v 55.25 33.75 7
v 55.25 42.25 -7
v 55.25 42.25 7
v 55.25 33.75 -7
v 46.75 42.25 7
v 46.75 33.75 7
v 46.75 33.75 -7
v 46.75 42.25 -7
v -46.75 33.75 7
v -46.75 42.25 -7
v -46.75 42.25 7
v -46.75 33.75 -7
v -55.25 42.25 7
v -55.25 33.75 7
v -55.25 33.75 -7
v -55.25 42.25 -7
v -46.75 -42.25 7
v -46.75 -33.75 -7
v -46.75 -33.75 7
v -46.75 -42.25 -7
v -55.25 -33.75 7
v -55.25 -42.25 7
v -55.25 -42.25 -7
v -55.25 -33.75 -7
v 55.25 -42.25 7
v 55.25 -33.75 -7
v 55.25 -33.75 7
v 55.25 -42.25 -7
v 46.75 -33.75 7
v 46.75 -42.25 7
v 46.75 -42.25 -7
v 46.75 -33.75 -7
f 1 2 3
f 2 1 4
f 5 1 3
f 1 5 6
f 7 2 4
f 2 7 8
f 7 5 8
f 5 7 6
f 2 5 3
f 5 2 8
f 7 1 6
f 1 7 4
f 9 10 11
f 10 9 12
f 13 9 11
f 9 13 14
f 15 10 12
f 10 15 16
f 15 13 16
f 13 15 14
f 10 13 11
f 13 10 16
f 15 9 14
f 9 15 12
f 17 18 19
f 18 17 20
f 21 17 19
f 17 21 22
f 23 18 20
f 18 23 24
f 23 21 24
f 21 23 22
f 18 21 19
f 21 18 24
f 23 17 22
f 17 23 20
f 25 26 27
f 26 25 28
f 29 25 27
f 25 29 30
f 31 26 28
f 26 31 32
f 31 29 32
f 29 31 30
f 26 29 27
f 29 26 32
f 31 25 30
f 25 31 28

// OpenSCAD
// ============================================================================
// Atom Lithography Machine — Parametric OpenSCAD Module (S4.3-03)
// ============================================================================
// part_id           : S4.3-03
// parent_bom_id     : S4.3
// subsystem         : S4
// part_name         : Kademe ici kapasitif konum geri-besleme sensorleri ve UHV kablolari
// material          : Au
// temp_stage        : 300 K (UHV)
// vacuum_grade      : UHV 1e-9 mbar
// tolerance         : ±0.2 nm
// computed_mass_kg  : 0.02225
// envelope_mm       : 110.500 x 84.500 x 40.000
// design_maturity   : M0_M1_DETAILED_CAD_DESIGN_ONLY
// no_lab_measurement: true
// iec61508_certified: false
// semi_s2_certified : false
// Units: millimeters (mm)
// ============================================================================

$fn = 64;

// Nominal bounding envelope parameters (mm)
bbox_x = 110.5000;
bbox_y = 84.5000;
bbox_z = 40.0000;

// Part-specific parametric dimensions
n_sensor_pods = 4;
pod_x_mm = 51.0;
pod_y_mm = 38.0;

// Interface / port parameters (mm)

module part_S4_3_03() {
  union() {
    // Sub-nm capacitive feedback sensor pod #1
    translate([51.000, 38.000, 0.000]) cube([8.500, 8.500, 14.000], center=true);
    // Sub-nm capacitive feedback sensor pod #2
    translate([-51.000, 38.000, 0.000]) cube([8.500, 8.500, 14.000], center=true);
    // Sub-nm capacitive feedback sensor pod #3
    translate([-51.000, -38.000, 0.000]) cube([8.500, 8.500, 14.000], center=true);
    // Sub-nm capacitive feedback sensor pod #4
    translate([51.000, -38.000, 0.000]) cube([8.500, 8.500, 14.000], center=true);
  }
}

// World assembly mounting transform (global machine frame, mm / deg):
// translate([0.000, 0.000, -41.000]) rotate([0.000, 0.000, 0.000]) part_S4_3_03();

part_S4_3_03();
